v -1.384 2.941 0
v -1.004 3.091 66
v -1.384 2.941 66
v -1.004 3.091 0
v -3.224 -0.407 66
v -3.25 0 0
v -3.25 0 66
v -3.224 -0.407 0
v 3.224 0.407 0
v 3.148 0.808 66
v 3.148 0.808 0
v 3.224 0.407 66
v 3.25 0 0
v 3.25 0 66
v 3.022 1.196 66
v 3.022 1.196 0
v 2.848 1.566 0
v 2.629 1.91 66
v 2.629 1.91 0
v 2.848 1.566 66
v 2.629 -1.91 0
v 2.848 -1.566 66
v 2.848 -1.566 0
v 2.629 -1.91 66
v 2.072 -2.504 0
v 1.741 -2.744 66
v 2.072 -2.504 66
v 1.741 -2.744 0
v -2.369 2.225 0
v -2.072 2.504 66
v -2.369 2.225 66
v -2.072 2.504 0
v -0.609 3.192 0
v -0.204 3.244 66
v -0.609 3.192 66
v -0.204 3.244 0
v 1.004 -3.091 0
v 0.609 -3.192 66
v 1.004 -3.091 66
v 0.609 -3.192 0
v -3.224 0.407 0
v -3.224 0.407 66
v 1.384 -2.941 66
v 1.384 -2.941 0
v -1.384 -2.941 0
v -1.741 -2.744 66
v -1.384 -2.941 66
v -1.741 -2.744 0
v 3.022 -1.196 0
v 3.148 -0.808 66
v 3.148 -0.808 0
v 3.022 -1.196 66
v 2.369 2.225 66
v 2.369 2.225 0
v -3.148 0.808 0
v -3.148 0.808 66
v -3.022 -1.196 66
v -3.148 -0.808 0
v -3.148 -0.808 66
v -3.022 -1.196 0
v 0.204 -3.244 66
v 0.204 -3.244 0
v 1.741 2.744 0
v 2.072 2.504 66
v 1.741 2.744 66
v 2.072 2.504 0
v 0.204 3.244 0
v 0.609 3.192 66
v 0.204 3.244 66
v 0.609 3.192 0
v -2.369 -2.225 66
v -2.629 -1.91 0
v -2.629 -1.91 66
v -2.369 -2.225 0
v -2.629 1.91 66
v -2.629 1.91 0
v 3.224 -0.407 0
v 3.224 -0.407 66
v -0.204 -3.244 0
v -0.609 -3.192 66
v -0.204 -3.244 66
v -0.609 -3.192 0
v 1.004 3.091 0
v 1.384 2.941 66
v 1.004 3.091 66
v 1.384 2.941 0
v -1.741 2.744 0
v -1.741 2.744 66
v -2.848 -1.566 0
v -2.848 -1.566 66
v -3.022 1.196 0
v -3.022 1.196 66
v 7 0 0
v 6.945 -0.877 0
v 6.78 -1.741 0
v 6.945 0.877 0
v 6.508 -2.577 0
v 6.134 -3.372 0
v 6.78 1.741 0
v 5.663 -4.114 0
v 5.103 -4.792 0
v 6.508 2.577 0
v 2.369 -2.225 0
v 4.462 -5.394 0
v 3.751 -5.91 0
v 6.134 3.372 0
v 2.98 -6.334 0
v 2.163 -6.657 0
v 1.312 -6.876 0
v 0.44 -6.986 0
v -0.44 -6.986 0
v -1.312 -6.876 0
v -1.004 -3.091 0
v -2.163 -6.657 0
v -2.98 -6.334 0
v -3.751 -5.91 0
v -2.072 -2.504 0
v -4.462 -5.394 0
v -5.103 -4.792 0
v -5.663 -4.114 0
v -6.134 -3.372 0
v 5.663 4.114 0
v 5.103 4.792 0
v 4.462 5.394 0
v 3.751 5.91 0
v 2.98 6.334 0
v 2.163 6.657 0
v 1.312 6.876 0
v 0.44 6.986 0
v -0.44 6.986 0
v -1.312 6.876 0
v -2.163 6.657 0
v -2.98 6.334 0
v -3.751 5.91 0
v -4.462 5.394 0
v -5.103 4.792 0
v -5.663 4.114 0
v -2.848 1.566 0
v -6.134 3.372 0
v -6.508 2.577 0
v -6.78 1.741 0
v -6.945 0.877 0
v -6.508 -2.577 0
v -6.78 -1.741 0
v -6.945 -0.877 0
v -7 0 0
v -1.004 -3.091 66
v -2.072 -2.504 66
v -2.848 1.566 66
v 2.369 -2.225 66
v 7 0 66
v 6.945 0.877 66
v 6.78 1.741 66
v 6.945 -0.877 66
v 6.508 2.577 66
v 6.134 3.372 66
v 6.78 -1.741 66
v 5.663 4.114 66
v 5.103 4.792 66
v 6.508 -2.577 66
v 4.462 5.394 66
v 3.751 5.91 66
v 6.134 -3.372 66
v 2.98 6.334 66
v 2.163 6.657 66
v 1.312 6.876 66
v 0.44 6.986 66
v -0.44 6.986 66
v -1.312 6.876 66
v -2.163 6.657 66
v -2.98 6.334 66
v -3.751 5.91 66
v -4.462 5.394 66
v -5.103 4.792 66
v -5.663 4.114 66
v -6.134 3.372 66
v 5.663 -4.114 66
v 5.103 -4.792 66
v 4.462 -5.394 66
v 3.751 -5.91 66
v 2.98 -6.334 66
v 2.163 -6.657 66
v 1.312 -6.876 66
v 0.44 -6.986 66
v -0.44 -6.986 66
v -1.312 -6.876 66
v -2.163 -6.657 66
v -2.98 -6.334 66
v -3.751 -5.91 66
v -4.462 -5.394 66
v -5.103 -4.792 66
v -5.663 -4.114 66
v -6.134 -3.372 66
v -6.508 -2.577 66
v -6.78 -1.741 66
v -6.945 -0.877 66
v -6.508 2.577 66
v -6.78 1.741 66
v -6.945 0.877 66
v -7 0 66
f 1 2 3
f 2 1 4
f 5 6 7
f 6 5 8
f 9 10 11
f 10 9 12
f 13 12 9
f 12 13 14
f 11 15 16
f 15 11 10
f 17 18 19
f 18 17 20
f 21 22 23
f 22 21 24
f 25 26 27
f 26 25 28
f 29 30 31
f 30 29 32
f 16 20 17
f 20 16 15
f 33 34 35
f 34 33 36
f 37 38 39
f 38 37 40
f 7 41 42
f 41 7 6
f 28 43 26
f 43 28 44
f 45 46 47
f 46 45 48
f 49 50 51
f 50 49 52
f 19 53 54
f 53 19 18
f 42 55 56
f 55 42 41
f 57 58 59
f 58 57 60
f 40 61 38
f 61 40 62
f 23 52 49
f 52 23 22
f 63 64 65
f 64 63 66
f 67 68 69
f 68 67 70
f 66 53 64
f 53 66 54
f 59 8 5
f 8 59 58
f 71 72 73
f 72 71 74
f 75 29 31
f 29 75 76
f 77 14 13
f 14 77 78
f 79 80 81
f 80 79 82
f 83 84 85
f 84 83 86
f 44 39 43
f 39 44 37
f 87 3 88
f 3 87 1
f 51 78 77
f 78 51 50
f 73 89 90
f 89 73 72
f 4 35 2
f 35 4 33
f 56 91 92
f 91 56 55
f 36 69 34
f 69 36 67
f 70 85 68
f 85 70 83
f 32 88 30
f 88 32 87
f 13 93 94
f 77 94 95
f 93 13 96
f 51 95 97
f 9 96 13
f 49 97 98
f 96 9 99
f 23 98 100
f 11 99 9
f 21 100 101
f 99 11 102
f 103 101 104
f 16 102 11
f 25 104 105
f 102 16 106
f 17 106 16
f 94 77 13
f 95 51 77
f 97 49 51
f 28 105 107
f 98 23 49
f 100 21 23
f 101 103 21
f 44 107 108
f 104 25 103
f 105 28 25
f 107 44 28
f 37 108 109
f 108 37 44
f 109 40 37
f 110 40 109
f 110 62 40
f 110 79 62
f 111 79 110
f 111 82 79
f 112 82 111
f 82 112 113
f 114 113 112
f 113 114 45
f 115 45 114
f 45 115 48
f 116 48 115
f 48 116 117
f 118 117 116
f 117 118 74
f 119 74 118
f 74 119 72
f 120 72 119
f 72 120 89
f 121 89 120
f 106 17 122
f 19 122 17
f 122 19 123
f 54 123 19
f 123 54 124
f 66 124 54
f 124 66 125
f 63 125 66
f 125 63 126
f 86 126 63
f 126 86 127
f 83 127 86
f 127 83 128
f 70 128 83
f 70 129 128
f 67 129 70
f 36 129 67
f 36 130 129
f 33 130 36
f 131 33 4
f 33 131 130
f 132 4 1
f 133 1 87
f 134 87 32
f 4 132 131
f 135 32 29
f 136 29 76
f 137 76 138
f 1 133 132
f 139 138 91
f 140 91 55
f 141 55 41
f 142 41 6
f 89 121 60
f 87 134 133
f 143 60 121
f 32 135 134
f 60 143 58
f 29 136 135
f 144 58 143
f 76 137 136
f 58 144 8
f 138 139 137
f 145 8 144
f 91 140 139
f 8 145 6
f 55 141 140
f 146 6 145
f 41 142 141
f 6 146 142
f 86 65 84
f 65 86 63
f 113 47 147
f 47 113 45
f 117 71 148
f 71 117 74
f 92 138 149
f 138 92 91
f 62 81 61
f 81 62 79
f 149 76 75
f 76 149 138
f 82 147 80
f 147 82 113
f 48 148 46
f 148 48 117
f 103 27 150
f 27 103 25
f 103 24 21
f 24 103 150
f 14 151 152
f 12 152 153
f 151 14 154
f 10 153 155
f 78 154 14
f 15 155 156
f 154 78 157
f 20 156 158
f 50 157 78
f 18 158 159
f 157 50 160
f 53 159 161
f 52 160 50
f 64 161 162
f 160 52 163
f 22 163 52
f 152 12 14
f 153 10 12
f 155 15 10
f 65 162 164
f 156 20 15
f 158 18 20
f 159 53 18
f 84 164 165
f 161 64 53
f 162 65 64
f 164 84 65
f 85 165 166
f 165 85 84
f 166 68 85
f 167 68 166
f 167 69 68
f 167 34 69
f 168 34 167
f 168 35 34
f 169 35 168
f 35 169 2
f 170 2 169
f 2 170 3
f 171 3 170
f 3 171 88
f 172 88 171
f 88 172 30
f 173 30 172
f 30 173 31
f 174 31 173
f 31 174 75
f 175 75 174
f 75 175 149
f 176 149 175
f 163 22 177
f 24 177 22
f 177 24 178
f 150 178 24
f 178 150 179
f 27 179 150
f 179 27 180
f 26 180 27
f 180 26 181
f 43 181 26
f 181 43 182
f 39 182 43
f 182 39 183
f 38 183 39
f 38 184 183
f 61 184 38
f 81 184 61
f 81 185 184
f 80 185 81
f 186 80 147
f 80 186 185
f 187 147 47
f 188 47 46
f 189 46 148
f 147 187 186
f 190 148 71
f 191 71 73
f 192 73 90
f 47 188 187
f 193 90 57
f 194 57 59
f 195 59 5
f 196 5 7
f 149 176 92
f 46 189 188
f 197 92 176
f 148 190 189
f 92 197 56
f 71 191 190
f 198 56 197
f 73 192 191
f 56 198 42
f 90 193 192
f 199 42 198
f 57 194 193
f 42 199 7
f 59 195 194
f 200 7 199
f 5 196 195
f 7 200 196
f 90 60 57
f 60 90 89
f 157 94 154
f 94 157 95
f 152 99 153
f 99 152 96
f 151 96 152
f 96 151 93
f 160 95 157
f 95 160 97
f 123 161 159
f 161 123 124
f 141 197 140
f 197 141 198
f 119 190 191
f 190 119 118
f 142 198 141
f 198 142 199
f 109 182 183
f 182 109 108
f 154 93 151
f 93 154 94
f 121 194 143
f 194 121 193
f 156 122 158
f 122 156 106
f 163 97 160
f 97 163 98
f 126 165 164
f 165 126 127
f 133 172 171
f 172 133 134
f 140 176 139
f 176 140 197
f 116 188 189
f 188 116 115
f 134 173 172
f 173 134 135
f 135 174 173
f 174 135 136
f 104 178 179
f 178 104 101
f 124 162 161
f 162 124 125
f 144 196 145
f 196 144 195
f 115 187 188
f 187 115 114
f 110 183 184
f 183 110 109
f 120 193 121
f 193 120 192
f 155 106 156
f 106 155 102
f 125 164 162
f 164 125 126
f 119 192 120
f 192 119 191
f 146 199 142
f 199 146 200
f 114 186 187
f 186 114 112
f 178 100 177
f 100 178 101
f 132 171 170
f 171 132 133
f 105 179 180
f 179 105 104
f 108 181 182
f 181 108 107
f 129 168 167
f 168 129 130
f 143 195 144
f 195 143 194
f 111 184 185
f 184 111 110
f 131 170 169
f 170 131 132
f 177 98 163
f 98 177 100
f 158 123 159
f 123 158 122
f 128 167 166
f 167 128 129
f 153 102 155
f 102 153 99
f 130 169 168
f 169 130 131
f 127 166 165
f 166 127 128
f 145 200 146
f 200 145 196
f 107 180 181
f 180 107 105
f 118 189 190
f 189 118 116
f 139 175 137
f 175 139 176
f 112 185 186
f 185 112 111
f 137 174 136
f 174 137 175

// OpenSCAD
$fn = 50;


difference() {
	union() {
		cylinder(h = 66, r = 7.0000000000);
	}
	union() {
		cylinder(h = 66, r = 3.2500000000);
		cylinder(h = 66, r = 1.8000000000);
		cylinder(h = 66, r = 1.8000000000);
		cylinder(h = 66, r = 1.8000000000);
	}
}
